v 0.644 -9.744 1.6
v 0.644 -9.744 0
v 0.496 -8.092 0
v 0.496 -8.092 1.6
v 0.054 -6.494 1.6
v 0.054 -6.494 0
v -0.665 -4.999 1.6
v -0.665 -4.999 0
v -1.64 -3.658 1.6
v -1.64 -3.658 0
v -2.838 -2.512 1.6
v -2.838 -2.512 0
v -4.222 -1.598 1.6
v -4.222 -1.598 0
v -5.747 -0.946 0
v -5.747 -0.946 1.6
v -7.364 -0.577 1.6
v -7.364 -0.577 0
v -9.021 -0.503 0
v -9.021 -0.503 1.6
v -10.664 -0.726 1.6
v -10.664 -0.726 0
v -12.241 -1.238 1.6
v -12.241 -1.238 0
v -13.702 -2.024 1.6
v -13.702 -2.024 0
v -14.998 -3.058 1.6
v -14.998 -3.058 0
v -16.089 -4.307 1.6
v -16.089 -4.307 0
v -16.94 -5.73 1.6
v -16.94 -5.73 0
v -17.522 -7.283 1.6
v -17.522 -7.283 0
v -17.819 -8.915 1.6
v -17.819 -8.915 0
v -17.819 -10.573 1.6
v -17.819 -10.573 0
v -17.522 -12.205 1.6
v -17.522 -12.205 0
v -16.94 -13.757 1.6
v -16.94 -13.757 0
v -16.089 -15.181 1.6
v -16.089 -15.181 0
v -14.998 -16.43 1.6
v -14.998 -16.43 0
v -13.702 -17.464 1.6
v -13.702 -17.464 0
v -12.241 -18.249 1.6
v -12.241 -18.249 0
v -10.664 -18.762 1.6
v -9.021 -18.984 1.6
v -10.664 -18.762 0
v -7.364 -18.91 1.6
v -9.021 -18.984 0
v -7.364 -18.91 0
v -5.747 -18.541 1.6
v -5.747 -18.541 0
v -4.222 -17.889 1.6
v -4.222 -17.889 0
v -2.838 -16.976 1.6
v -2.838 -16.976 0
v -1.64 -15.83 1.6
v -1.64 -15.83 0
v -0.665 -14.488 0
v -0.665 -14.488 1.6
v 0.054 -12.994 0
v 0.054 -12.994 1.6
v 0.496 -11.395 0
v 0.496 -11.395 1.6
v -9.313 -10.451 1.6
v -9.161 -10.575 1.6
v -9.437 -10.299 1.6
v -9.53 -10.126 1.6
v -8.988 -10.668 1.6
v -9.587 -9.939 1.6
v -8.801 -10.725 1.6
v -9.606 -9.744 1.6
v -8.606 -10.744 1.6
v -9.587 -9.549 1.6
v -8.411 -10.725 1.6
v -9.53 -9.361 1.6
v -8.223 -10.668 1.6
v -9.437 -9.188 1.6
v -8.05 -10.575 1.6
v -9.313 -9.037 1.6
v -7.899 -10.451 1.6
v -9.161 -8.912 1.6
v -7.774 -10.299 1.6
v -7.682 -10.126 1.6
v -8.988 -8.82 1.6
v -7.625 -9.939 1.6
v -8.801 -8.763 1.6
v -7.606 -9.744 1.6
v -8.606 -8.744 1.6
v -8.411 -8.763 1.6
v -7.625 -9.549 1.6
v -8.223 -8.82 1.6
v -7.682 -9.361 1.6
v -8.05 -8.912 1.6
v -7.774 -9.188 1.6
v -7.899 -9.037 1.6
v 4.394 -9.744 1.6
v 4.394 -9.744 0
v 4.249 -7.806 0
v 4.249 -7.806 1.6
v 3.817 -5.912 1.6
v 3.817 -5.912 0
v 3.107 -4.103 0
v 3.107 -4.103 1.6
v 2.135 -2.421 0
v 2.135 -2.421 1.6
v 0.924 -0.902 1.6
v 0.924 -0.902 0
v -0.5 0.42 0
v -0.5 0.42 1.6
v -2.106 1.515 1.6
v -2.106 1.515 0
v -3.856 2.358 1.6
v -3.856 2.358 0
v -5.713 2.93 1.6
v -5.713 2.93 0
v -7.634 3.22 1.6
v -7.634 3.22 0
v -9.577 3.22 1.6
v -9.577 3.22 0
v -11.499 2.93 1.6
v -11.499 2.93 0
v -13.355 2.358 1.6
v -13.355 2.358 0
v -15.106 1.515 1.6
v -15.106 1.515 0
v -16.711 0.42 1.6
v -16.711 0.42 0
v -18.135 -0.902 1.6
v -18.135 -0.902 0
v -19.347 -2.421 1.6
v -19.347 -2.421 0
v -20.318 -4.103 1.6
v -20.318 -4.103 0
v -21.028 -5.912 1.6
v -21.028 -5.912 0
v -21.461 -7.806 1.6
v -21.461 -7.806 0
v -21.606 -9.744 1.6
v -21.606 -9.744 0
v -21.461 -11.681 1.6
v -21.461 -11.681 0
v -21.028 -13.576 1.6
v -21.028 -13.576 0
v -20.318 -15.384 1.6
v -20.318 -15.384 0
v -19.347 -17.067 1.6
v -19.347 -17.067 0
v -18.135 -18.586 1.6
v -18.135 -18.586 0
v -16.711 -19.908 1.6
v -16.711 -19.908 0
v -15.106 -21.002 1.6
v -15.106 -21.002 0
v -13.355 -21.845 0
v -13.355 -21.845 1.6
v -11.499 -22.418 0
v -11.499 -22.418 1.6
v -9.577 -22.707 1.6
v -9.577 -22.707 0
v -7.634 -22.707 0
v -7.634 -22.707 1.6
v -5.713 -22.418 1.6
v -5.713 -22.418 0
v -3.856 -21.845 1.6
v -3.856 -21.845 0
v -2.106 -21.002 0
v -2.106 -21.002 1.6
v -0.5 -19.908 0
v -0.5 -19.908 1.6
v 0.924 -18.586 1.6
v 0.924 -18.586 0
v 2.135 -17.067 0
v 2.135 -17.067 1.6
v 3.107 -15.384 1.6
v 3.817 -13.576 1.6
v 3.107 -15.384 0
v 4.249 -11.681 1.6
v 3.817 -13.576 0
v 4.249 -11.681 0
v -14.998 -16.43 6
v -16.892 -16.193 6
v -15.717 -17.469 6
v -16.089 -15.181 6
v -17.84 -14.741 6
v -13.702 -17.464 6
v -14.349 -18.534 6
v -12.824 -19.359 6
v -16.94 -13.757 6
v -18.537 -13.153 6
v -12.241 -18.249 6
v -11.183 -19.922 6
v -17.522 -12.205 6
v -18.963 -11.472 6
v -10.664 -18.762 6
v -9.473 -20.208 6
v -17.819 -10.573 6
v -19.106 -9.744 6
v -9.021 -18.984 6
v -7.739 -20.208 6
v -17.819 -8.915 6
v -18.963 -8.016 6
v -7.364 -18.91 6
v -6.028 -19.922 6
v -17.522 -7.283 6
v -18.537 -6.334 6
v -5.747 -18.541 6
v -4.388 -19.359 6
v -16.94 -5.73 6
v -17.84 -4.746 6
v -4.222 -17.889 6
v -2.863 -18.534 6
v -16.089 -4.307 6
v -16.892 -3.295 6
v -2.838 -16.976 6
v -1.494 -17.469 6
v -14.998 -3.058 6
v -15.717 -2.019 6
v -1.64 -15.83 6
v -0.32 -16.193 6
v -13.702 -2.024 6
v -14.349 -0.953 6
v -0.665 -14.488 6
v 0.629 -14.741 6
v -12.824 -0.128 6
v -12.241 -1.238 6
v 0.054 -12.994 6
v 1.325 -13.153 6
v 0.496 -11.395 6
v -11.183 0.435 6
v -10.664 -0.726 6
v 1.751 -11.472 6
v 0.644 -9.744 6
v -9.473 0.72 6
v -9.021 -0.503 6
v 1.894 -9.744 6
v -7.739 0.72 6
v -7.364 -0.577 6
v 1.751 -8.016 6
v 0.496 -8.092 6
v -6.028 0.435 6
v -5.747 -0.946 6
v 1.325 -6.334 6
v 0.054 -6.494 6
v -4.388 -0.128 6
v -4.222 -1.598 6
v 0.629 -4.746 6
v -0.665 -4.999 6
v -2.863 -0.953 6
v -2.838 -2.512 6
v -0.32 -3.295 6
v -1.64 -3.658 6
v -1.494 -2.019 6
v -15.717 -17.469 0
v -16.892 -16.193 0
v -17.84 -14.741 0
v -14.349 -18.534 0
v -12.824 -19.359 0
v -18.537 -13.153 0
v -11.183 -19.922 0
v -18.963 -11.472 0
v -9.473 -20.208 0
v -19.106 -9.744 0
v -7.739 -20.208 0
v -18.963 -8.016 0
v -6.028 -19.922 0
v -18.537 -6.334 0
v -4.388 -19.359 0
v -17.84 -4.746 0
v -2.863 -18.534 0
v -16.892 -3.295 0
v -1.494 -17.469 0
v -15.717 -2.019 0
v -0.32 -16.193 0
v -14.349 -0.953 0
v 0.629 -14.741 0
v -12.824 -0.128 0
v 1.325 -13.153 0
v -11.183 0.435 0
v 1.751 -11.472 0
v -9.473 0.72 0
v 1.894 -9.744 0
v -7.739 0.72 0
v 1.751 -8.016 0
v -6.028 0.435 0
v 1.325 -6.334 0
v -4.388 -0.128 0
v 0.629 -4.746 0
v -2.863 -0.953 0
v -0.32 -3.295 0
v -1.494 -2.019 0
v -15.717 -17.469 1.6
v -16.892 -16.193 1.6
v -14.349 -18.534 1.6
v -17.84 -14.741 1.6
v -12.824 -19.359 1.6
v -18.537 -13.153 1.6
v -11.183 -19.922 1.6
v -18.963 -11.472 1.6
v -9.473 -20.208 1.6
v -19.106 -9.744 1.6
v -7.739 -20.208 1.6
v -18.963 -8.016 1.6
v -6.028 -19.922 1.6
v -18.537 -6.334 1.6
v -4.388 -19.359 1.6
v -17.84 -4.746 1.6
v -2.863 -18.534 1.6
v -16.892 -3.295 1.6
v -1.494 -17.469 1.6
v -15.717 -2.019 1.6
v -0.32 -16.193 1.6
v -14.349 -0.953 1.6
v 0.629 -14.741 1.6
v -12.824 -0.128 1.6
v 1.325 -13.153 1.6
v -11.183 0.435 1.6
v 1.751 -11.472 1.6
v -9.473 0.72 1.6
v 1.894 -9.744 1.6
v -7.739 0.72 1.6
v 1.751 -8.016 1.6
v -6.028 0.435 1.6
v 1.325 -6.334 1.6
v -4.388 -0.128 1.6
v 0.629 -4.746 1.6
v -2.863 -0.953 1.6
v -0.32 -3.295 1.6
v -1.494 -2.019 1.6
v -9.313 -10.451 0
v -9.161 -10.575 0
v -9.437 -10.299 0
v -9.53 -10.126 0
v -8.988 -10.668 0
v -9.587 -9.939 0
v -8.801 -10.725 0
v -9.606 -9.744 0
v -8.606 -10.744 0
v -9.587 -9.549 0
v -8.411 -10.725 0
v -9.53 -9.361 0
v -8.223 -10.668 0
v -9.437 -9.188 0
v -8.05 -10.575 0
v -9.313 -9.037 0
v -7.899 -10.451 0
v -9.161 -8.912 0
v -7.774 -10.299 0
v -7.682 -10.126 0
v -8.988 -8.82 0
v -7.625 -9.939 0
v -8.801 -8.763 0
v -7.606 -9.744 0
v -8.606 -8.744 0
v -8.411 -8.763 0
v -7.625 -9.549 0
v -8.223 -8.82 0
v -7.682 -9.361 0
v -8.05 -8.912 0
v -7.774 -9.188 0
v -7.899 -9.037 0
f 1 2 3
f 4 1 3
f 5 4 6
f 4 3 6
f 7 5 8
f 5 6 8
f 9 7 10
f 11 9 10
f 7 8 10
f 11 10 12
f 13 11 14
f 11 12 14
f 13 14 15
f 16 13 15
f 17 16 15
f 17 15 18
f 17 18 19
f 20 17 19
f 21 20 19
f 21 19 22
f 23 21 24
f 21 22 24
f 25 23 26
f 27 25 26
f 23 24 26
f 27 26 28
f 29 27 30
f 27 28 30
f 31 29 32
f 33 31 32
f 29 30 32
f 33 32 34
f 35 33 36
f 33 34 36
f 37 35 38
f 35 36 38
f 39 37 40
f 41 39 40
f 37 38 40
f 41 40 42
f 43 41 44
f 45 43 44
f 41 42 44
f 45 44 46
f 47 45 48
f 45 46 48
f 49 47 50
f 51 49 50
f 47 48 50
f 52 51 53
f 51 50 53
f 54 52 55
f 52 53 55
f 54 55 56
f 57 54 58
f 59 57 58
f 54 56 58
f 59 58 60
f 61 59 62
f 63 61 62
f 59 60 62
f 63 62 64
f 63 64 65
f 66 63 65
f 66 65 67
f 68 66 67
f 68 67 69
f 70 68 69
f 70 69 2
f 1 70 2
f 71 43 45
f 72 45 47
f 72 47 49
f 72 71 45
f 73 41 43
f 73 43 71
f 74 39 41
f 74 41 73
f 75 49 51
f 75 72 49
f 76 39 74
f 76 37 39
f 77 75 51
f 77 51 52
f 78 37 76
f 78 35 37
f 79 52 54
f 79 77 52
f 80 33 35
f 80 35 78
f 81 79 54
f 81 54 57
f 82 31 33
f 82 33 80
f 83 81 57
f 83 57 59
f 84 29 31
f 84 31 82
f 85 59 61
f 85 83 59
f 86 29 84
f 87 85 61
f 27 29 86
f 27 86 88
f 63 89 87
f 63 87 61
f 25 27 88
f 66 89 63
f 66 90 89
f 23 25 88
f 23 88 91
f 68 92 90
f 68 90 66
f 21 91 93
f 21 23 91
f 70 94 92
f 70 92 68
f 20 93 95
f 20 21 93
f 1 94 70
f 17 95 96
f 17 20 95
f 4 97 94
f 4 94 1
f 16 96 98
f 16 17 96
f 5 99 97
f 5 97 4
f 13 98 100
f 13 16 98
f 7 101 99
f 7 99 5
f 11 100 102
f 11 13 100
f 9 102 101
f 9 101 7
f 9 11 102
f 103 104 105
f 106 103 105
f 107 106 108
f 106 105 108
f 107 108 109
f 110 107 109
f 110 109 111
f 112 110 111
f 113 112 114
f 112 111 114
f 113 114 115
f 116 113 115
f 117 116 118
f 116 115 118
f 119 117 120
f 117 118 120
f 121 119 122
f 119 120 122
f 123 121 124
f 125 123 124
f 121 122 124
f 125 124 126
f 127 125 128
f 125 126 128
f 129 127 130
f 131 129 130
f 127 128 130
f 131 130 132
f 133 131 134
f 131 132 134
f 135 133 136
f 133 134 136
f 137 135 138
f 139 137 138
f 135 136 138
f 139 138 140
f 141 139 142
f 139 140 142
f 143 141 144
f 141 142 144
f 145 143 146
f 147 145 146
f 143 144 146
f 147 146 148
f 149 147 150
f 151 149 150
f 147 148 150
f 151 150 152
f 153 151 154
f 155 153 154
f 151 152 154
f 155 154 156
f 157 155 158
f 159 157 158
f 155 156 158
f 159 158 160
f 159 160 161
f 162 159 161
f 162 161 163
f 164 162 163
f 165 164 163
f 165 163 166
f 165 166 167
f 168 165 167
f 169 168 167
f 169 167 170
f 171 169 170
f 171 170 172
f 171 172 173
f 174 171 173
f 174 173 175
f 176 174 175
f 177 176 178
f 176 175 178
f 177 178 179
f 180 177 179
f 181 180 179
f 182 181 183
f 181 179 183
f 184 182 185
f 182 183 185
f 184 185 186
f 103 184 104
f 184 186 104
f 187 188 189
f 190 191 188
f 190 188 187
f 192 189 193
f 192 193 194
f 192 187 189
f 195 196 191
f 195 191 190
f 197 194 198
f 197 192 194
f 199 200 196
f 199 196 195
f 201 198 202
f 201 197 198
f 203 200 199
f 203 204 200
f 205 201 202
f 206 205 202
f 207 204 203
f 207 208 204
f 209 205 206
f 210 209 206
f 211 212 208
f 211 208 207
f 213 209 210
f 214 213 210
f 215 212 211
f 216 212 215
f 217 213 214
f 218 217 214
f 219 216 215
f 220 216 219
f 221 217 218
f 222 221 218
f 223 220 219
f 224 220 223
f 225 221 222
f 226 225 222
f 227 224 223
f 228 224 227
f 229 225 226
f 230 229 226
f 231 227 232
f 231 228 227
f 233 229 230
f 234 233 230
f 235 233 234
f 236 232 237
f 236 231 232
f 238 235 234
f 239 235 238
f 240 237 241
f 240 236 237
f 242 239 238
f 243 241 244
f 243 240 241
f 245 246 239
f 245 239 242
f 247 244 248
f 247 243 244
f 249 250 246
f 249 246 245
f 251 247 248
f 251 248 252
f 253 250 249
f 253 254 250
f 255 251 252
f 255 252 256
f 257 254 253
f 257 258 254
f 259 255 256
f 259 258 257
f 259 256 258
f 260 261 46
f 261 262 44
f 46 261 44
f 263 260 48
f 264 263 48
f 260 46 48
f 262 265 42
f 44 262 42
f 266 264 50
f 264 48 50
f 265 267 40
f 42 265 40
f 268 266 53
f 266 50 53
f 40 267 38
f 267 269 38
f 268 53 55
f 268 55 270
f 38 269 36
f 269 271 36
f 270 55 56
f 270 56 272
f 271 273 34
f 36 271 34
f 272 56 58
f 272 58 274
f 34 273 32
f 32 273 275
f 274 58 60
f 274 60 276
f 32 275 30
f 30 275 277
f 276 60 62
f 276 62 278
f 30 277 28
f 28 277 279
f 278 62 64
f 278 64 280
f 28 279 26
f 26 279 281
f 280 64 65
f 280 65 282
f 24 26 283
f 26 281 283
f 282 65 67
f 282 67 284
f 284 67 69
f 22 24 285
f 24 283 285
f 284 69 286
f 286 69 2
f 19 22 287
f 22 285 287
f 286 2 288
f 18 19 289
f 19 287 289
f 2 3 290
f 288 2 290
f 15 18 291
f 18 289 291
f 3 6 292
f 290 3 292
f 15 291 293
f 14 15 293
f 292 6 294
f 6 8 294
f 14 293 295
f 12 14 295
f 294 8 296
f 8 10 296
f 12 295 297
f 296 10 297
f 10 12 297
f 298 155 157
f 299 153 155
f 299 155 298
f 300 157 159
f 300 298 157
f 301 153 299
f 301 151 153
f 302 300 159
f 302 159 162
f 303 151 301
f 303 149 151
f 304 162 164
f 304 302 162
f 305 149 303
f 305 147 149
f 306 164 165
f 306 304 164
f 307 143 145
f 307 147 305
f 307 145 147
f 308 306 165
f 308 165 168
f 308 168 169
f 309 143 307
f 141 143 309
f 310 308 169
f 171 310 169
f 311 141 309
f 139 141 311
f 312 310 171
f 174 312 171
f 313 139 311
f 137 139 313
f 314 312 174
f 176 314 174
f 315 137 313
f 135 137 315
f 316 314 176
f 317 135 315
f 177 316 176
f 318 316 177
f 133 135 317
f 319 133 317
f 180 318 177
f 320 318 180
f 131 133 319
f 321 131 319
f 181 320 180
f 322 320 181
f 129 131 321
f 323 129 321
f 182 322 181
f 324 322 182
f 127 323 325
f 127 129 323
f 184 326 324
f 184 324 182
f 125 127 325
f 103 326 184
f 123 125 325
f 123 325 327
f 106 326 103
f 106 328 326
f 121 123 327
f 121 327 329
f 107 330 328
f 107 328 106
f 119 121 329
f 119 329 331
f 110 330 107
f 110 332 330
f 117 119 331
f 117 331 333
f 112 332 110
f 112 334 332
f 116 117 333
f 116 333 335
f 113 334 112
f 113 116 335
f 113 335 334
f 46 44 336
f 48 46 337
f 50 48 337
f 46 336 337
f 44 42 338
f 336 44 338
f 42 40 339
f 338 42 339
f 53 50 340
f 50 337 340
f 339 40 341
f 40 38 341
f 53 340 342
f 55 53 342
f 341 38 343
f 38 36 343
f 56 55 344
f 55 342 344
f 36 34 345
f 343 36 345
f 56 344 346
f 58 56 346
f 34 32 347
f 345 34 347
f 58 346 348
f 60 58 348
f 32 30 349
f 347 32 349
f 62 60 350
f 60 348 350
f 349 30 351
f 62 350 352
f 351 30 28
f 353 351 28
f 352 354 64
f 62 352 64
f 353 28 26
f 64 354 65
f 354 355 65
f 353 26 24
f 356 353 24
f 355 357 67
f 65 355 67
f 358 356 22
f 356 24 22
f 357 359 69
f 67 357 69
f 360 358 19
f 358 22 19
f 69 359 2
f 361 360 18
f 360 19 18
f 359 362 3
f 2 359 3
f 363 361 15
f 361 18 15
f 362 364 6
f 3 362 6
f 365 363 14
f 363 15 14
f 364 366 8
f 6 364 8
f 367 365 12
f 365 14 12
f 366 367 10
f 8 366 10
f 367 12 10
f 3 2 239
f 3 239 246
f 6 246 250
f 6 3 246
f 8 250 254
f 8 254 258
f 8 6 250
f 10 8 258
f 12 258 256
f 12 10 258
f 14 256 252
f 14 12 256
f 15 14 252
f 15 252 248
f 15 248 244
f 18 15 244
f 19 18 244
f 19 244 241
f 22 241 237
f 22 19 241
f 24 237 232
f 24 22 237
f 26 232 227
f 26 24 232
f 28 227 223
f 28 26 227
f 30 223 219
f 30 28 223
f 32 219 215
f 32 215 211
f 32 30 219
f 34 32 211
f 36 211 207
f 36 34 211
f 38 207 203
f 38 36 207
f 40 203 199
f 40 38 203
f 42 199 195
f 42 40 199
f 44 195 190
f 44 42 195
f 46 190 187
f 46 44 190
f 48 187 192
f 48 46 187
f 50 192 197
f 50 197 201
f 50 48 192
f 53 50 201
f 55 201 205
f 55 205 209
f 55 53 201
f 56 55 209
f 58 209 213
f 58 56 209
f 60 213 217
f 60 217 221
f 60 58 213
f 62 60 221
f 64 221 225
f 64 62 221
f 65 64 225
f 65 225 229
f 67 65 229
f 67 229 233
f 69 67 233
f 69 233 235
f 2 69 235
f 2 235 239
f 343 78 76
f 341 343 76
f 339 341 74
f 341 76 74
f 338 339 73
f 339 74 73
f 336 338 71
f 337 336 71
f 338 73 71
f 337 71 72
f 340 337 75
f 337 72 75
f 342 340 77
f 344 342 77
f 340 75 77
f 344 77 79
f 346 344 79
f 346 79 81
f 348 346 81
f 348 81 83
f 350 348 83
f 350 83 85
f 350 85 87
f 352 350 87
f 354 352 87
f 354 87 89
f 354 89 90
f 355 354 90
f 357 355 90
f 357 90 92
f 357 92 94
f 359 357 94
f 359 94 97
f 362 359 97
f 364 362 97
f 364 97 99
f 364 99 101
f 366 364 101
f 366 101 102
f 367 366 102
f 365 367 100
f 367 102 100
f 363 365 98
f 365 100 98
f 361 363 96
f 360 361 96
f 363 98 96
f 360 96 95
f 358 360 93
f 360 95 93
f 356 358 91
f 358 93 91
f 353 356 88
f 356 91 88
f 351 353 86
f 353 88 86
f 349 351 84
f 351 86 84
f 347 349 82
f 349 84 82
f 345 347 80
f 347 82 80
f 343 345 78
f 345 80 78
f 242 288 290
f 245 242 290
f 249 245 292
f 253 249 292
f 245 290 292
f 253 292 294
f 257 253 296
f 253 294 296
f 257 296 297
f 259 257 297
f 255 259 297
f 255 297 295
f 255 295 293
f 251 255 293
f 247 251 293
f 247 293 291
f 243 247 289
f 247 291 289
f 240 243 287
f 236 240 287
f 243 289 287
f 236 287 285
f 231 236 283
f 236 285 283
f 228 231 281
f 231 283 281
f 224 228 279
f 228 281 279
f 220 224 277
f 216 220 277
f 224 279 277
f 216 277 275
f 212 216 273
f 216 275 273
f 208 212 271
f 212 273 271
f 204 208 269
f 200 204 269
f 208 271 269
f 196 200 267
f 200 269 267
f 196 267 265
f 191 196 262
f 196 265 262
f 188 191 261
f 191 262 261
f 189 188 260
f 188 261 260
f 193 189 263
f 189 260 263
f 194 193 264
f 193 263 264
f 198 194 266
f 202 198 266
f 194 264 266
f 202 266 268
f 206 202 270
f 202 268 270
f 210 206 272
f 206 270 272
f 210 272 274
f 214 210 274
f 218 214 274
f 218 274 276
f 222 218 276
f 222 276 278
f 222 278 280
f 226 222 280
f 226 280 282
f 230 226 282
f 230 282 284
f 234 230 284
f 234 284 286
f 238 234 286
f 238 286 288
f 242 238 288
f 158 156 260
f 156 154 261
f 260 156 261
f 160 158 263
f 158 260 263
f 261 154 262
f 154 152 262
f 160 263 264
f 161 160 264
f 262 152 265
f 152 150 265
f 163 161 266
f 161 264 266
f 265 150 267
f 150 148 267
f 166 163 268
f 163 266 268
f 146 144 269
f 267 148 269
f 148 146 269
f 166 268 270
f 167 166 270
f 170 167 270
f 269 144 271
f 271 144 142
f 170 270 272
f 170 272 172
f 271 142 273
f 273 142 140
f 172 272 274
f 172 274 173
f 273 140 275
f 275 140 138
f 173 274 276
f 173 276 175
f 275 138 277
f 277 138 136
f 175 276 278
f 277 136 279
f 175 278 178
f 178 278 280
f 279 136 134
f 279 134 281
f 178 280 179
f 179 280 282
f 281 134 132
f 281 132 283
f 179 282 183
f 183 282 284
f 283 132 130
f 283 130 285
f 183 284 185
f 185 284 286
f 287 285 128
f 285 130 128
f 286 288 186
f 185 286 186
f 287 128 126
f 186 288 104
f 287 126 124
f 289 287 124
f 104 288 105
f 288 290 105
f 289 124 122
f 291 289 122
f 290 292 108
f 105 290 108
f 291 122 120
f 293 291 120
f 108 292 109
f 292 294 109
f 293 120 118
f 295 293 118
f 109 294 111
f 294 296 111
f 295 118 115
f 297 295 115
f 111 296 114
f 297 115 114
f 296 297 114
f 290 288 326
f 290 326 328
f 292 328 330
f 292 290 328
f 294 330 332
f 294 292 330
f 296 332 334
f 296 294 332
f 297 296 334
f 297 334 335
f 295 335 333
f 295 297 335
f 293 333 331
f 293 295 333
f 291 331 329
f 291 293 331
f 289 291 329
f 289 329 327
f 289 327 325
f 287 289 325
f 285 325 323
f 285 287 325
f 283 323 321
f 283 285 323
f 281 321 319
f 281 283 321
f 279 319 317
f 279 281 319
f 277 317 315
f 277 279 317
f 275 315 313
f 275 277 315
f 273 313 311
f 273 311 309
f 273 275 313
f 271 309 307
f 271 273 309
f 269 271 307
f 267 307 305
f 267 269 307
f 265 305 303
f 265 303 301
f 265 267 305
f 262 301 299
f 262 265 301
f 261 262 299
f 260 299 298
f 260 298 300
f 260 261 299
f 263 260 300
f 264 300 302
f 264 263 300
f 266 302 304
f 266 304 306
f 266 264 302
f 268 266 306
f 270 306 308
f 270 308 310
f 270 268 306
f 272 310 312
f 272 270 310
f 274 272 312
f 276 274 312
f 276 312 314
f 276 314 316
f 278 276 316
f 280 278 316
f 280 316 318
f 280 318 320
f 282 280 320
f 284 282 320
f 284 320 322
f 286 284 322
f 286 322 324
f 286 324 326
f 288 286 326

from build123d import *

# Parameters (mm, degrees)
F0_R     = 13
F0_R_2   = 10.5
F1_DEPTH = 1.6
F0_R_3   = 9.25
F2_DEPTH = 6
F3_D     = 2


with BuildPart() as f1:
    # F0 (on Top) → F1 (new body)
    with BuildSketch(Plane.XY):
        with Locations((-8.6057770987, -9.7437467397)):
            Circle(F0_R)
        with Locations((-8.6057770987, -9.7437467397)):
            Circle(F0_R_2, mode=Mode.SUBTRACT)
    extrude(amount=F1_DEPTH)


with BuildPart() as f1b:
    # F0 (on Top) → F1, piece 2 (new body)
    with BuildSketch(Plane.XY):
        with Locations((-8.6057770987, -9.7437467397)):
            Circle(F0_R_3)
    extrude(amount=F1_DEPTH)

    # F3 (through all)
    with Locations(Plane(origin=(0, 0, 0), x_dir=(1, 0, 0), z_dir=(0, 0, -1))):
        with Locations((-8.6057770987, 9.7437467397)):
            Hole(F3_D / 2)


with BuildPart() as f2:
    # F0 (on Top) → F2 (new body)
    with BuildSketch(Plane.XY):
        with Locations((-8.6057770987, -9.7437467397)):
            Circle(F0_R_2)
        with Locations((-8.6057770987, -9.7437467397)):
            Circle(F0_R_3, mode=Mode.SUBTRACT)
    extrude(amount=F2_DEPTH)


solid = Compound([f1.part, f1b.part, f2.part])
